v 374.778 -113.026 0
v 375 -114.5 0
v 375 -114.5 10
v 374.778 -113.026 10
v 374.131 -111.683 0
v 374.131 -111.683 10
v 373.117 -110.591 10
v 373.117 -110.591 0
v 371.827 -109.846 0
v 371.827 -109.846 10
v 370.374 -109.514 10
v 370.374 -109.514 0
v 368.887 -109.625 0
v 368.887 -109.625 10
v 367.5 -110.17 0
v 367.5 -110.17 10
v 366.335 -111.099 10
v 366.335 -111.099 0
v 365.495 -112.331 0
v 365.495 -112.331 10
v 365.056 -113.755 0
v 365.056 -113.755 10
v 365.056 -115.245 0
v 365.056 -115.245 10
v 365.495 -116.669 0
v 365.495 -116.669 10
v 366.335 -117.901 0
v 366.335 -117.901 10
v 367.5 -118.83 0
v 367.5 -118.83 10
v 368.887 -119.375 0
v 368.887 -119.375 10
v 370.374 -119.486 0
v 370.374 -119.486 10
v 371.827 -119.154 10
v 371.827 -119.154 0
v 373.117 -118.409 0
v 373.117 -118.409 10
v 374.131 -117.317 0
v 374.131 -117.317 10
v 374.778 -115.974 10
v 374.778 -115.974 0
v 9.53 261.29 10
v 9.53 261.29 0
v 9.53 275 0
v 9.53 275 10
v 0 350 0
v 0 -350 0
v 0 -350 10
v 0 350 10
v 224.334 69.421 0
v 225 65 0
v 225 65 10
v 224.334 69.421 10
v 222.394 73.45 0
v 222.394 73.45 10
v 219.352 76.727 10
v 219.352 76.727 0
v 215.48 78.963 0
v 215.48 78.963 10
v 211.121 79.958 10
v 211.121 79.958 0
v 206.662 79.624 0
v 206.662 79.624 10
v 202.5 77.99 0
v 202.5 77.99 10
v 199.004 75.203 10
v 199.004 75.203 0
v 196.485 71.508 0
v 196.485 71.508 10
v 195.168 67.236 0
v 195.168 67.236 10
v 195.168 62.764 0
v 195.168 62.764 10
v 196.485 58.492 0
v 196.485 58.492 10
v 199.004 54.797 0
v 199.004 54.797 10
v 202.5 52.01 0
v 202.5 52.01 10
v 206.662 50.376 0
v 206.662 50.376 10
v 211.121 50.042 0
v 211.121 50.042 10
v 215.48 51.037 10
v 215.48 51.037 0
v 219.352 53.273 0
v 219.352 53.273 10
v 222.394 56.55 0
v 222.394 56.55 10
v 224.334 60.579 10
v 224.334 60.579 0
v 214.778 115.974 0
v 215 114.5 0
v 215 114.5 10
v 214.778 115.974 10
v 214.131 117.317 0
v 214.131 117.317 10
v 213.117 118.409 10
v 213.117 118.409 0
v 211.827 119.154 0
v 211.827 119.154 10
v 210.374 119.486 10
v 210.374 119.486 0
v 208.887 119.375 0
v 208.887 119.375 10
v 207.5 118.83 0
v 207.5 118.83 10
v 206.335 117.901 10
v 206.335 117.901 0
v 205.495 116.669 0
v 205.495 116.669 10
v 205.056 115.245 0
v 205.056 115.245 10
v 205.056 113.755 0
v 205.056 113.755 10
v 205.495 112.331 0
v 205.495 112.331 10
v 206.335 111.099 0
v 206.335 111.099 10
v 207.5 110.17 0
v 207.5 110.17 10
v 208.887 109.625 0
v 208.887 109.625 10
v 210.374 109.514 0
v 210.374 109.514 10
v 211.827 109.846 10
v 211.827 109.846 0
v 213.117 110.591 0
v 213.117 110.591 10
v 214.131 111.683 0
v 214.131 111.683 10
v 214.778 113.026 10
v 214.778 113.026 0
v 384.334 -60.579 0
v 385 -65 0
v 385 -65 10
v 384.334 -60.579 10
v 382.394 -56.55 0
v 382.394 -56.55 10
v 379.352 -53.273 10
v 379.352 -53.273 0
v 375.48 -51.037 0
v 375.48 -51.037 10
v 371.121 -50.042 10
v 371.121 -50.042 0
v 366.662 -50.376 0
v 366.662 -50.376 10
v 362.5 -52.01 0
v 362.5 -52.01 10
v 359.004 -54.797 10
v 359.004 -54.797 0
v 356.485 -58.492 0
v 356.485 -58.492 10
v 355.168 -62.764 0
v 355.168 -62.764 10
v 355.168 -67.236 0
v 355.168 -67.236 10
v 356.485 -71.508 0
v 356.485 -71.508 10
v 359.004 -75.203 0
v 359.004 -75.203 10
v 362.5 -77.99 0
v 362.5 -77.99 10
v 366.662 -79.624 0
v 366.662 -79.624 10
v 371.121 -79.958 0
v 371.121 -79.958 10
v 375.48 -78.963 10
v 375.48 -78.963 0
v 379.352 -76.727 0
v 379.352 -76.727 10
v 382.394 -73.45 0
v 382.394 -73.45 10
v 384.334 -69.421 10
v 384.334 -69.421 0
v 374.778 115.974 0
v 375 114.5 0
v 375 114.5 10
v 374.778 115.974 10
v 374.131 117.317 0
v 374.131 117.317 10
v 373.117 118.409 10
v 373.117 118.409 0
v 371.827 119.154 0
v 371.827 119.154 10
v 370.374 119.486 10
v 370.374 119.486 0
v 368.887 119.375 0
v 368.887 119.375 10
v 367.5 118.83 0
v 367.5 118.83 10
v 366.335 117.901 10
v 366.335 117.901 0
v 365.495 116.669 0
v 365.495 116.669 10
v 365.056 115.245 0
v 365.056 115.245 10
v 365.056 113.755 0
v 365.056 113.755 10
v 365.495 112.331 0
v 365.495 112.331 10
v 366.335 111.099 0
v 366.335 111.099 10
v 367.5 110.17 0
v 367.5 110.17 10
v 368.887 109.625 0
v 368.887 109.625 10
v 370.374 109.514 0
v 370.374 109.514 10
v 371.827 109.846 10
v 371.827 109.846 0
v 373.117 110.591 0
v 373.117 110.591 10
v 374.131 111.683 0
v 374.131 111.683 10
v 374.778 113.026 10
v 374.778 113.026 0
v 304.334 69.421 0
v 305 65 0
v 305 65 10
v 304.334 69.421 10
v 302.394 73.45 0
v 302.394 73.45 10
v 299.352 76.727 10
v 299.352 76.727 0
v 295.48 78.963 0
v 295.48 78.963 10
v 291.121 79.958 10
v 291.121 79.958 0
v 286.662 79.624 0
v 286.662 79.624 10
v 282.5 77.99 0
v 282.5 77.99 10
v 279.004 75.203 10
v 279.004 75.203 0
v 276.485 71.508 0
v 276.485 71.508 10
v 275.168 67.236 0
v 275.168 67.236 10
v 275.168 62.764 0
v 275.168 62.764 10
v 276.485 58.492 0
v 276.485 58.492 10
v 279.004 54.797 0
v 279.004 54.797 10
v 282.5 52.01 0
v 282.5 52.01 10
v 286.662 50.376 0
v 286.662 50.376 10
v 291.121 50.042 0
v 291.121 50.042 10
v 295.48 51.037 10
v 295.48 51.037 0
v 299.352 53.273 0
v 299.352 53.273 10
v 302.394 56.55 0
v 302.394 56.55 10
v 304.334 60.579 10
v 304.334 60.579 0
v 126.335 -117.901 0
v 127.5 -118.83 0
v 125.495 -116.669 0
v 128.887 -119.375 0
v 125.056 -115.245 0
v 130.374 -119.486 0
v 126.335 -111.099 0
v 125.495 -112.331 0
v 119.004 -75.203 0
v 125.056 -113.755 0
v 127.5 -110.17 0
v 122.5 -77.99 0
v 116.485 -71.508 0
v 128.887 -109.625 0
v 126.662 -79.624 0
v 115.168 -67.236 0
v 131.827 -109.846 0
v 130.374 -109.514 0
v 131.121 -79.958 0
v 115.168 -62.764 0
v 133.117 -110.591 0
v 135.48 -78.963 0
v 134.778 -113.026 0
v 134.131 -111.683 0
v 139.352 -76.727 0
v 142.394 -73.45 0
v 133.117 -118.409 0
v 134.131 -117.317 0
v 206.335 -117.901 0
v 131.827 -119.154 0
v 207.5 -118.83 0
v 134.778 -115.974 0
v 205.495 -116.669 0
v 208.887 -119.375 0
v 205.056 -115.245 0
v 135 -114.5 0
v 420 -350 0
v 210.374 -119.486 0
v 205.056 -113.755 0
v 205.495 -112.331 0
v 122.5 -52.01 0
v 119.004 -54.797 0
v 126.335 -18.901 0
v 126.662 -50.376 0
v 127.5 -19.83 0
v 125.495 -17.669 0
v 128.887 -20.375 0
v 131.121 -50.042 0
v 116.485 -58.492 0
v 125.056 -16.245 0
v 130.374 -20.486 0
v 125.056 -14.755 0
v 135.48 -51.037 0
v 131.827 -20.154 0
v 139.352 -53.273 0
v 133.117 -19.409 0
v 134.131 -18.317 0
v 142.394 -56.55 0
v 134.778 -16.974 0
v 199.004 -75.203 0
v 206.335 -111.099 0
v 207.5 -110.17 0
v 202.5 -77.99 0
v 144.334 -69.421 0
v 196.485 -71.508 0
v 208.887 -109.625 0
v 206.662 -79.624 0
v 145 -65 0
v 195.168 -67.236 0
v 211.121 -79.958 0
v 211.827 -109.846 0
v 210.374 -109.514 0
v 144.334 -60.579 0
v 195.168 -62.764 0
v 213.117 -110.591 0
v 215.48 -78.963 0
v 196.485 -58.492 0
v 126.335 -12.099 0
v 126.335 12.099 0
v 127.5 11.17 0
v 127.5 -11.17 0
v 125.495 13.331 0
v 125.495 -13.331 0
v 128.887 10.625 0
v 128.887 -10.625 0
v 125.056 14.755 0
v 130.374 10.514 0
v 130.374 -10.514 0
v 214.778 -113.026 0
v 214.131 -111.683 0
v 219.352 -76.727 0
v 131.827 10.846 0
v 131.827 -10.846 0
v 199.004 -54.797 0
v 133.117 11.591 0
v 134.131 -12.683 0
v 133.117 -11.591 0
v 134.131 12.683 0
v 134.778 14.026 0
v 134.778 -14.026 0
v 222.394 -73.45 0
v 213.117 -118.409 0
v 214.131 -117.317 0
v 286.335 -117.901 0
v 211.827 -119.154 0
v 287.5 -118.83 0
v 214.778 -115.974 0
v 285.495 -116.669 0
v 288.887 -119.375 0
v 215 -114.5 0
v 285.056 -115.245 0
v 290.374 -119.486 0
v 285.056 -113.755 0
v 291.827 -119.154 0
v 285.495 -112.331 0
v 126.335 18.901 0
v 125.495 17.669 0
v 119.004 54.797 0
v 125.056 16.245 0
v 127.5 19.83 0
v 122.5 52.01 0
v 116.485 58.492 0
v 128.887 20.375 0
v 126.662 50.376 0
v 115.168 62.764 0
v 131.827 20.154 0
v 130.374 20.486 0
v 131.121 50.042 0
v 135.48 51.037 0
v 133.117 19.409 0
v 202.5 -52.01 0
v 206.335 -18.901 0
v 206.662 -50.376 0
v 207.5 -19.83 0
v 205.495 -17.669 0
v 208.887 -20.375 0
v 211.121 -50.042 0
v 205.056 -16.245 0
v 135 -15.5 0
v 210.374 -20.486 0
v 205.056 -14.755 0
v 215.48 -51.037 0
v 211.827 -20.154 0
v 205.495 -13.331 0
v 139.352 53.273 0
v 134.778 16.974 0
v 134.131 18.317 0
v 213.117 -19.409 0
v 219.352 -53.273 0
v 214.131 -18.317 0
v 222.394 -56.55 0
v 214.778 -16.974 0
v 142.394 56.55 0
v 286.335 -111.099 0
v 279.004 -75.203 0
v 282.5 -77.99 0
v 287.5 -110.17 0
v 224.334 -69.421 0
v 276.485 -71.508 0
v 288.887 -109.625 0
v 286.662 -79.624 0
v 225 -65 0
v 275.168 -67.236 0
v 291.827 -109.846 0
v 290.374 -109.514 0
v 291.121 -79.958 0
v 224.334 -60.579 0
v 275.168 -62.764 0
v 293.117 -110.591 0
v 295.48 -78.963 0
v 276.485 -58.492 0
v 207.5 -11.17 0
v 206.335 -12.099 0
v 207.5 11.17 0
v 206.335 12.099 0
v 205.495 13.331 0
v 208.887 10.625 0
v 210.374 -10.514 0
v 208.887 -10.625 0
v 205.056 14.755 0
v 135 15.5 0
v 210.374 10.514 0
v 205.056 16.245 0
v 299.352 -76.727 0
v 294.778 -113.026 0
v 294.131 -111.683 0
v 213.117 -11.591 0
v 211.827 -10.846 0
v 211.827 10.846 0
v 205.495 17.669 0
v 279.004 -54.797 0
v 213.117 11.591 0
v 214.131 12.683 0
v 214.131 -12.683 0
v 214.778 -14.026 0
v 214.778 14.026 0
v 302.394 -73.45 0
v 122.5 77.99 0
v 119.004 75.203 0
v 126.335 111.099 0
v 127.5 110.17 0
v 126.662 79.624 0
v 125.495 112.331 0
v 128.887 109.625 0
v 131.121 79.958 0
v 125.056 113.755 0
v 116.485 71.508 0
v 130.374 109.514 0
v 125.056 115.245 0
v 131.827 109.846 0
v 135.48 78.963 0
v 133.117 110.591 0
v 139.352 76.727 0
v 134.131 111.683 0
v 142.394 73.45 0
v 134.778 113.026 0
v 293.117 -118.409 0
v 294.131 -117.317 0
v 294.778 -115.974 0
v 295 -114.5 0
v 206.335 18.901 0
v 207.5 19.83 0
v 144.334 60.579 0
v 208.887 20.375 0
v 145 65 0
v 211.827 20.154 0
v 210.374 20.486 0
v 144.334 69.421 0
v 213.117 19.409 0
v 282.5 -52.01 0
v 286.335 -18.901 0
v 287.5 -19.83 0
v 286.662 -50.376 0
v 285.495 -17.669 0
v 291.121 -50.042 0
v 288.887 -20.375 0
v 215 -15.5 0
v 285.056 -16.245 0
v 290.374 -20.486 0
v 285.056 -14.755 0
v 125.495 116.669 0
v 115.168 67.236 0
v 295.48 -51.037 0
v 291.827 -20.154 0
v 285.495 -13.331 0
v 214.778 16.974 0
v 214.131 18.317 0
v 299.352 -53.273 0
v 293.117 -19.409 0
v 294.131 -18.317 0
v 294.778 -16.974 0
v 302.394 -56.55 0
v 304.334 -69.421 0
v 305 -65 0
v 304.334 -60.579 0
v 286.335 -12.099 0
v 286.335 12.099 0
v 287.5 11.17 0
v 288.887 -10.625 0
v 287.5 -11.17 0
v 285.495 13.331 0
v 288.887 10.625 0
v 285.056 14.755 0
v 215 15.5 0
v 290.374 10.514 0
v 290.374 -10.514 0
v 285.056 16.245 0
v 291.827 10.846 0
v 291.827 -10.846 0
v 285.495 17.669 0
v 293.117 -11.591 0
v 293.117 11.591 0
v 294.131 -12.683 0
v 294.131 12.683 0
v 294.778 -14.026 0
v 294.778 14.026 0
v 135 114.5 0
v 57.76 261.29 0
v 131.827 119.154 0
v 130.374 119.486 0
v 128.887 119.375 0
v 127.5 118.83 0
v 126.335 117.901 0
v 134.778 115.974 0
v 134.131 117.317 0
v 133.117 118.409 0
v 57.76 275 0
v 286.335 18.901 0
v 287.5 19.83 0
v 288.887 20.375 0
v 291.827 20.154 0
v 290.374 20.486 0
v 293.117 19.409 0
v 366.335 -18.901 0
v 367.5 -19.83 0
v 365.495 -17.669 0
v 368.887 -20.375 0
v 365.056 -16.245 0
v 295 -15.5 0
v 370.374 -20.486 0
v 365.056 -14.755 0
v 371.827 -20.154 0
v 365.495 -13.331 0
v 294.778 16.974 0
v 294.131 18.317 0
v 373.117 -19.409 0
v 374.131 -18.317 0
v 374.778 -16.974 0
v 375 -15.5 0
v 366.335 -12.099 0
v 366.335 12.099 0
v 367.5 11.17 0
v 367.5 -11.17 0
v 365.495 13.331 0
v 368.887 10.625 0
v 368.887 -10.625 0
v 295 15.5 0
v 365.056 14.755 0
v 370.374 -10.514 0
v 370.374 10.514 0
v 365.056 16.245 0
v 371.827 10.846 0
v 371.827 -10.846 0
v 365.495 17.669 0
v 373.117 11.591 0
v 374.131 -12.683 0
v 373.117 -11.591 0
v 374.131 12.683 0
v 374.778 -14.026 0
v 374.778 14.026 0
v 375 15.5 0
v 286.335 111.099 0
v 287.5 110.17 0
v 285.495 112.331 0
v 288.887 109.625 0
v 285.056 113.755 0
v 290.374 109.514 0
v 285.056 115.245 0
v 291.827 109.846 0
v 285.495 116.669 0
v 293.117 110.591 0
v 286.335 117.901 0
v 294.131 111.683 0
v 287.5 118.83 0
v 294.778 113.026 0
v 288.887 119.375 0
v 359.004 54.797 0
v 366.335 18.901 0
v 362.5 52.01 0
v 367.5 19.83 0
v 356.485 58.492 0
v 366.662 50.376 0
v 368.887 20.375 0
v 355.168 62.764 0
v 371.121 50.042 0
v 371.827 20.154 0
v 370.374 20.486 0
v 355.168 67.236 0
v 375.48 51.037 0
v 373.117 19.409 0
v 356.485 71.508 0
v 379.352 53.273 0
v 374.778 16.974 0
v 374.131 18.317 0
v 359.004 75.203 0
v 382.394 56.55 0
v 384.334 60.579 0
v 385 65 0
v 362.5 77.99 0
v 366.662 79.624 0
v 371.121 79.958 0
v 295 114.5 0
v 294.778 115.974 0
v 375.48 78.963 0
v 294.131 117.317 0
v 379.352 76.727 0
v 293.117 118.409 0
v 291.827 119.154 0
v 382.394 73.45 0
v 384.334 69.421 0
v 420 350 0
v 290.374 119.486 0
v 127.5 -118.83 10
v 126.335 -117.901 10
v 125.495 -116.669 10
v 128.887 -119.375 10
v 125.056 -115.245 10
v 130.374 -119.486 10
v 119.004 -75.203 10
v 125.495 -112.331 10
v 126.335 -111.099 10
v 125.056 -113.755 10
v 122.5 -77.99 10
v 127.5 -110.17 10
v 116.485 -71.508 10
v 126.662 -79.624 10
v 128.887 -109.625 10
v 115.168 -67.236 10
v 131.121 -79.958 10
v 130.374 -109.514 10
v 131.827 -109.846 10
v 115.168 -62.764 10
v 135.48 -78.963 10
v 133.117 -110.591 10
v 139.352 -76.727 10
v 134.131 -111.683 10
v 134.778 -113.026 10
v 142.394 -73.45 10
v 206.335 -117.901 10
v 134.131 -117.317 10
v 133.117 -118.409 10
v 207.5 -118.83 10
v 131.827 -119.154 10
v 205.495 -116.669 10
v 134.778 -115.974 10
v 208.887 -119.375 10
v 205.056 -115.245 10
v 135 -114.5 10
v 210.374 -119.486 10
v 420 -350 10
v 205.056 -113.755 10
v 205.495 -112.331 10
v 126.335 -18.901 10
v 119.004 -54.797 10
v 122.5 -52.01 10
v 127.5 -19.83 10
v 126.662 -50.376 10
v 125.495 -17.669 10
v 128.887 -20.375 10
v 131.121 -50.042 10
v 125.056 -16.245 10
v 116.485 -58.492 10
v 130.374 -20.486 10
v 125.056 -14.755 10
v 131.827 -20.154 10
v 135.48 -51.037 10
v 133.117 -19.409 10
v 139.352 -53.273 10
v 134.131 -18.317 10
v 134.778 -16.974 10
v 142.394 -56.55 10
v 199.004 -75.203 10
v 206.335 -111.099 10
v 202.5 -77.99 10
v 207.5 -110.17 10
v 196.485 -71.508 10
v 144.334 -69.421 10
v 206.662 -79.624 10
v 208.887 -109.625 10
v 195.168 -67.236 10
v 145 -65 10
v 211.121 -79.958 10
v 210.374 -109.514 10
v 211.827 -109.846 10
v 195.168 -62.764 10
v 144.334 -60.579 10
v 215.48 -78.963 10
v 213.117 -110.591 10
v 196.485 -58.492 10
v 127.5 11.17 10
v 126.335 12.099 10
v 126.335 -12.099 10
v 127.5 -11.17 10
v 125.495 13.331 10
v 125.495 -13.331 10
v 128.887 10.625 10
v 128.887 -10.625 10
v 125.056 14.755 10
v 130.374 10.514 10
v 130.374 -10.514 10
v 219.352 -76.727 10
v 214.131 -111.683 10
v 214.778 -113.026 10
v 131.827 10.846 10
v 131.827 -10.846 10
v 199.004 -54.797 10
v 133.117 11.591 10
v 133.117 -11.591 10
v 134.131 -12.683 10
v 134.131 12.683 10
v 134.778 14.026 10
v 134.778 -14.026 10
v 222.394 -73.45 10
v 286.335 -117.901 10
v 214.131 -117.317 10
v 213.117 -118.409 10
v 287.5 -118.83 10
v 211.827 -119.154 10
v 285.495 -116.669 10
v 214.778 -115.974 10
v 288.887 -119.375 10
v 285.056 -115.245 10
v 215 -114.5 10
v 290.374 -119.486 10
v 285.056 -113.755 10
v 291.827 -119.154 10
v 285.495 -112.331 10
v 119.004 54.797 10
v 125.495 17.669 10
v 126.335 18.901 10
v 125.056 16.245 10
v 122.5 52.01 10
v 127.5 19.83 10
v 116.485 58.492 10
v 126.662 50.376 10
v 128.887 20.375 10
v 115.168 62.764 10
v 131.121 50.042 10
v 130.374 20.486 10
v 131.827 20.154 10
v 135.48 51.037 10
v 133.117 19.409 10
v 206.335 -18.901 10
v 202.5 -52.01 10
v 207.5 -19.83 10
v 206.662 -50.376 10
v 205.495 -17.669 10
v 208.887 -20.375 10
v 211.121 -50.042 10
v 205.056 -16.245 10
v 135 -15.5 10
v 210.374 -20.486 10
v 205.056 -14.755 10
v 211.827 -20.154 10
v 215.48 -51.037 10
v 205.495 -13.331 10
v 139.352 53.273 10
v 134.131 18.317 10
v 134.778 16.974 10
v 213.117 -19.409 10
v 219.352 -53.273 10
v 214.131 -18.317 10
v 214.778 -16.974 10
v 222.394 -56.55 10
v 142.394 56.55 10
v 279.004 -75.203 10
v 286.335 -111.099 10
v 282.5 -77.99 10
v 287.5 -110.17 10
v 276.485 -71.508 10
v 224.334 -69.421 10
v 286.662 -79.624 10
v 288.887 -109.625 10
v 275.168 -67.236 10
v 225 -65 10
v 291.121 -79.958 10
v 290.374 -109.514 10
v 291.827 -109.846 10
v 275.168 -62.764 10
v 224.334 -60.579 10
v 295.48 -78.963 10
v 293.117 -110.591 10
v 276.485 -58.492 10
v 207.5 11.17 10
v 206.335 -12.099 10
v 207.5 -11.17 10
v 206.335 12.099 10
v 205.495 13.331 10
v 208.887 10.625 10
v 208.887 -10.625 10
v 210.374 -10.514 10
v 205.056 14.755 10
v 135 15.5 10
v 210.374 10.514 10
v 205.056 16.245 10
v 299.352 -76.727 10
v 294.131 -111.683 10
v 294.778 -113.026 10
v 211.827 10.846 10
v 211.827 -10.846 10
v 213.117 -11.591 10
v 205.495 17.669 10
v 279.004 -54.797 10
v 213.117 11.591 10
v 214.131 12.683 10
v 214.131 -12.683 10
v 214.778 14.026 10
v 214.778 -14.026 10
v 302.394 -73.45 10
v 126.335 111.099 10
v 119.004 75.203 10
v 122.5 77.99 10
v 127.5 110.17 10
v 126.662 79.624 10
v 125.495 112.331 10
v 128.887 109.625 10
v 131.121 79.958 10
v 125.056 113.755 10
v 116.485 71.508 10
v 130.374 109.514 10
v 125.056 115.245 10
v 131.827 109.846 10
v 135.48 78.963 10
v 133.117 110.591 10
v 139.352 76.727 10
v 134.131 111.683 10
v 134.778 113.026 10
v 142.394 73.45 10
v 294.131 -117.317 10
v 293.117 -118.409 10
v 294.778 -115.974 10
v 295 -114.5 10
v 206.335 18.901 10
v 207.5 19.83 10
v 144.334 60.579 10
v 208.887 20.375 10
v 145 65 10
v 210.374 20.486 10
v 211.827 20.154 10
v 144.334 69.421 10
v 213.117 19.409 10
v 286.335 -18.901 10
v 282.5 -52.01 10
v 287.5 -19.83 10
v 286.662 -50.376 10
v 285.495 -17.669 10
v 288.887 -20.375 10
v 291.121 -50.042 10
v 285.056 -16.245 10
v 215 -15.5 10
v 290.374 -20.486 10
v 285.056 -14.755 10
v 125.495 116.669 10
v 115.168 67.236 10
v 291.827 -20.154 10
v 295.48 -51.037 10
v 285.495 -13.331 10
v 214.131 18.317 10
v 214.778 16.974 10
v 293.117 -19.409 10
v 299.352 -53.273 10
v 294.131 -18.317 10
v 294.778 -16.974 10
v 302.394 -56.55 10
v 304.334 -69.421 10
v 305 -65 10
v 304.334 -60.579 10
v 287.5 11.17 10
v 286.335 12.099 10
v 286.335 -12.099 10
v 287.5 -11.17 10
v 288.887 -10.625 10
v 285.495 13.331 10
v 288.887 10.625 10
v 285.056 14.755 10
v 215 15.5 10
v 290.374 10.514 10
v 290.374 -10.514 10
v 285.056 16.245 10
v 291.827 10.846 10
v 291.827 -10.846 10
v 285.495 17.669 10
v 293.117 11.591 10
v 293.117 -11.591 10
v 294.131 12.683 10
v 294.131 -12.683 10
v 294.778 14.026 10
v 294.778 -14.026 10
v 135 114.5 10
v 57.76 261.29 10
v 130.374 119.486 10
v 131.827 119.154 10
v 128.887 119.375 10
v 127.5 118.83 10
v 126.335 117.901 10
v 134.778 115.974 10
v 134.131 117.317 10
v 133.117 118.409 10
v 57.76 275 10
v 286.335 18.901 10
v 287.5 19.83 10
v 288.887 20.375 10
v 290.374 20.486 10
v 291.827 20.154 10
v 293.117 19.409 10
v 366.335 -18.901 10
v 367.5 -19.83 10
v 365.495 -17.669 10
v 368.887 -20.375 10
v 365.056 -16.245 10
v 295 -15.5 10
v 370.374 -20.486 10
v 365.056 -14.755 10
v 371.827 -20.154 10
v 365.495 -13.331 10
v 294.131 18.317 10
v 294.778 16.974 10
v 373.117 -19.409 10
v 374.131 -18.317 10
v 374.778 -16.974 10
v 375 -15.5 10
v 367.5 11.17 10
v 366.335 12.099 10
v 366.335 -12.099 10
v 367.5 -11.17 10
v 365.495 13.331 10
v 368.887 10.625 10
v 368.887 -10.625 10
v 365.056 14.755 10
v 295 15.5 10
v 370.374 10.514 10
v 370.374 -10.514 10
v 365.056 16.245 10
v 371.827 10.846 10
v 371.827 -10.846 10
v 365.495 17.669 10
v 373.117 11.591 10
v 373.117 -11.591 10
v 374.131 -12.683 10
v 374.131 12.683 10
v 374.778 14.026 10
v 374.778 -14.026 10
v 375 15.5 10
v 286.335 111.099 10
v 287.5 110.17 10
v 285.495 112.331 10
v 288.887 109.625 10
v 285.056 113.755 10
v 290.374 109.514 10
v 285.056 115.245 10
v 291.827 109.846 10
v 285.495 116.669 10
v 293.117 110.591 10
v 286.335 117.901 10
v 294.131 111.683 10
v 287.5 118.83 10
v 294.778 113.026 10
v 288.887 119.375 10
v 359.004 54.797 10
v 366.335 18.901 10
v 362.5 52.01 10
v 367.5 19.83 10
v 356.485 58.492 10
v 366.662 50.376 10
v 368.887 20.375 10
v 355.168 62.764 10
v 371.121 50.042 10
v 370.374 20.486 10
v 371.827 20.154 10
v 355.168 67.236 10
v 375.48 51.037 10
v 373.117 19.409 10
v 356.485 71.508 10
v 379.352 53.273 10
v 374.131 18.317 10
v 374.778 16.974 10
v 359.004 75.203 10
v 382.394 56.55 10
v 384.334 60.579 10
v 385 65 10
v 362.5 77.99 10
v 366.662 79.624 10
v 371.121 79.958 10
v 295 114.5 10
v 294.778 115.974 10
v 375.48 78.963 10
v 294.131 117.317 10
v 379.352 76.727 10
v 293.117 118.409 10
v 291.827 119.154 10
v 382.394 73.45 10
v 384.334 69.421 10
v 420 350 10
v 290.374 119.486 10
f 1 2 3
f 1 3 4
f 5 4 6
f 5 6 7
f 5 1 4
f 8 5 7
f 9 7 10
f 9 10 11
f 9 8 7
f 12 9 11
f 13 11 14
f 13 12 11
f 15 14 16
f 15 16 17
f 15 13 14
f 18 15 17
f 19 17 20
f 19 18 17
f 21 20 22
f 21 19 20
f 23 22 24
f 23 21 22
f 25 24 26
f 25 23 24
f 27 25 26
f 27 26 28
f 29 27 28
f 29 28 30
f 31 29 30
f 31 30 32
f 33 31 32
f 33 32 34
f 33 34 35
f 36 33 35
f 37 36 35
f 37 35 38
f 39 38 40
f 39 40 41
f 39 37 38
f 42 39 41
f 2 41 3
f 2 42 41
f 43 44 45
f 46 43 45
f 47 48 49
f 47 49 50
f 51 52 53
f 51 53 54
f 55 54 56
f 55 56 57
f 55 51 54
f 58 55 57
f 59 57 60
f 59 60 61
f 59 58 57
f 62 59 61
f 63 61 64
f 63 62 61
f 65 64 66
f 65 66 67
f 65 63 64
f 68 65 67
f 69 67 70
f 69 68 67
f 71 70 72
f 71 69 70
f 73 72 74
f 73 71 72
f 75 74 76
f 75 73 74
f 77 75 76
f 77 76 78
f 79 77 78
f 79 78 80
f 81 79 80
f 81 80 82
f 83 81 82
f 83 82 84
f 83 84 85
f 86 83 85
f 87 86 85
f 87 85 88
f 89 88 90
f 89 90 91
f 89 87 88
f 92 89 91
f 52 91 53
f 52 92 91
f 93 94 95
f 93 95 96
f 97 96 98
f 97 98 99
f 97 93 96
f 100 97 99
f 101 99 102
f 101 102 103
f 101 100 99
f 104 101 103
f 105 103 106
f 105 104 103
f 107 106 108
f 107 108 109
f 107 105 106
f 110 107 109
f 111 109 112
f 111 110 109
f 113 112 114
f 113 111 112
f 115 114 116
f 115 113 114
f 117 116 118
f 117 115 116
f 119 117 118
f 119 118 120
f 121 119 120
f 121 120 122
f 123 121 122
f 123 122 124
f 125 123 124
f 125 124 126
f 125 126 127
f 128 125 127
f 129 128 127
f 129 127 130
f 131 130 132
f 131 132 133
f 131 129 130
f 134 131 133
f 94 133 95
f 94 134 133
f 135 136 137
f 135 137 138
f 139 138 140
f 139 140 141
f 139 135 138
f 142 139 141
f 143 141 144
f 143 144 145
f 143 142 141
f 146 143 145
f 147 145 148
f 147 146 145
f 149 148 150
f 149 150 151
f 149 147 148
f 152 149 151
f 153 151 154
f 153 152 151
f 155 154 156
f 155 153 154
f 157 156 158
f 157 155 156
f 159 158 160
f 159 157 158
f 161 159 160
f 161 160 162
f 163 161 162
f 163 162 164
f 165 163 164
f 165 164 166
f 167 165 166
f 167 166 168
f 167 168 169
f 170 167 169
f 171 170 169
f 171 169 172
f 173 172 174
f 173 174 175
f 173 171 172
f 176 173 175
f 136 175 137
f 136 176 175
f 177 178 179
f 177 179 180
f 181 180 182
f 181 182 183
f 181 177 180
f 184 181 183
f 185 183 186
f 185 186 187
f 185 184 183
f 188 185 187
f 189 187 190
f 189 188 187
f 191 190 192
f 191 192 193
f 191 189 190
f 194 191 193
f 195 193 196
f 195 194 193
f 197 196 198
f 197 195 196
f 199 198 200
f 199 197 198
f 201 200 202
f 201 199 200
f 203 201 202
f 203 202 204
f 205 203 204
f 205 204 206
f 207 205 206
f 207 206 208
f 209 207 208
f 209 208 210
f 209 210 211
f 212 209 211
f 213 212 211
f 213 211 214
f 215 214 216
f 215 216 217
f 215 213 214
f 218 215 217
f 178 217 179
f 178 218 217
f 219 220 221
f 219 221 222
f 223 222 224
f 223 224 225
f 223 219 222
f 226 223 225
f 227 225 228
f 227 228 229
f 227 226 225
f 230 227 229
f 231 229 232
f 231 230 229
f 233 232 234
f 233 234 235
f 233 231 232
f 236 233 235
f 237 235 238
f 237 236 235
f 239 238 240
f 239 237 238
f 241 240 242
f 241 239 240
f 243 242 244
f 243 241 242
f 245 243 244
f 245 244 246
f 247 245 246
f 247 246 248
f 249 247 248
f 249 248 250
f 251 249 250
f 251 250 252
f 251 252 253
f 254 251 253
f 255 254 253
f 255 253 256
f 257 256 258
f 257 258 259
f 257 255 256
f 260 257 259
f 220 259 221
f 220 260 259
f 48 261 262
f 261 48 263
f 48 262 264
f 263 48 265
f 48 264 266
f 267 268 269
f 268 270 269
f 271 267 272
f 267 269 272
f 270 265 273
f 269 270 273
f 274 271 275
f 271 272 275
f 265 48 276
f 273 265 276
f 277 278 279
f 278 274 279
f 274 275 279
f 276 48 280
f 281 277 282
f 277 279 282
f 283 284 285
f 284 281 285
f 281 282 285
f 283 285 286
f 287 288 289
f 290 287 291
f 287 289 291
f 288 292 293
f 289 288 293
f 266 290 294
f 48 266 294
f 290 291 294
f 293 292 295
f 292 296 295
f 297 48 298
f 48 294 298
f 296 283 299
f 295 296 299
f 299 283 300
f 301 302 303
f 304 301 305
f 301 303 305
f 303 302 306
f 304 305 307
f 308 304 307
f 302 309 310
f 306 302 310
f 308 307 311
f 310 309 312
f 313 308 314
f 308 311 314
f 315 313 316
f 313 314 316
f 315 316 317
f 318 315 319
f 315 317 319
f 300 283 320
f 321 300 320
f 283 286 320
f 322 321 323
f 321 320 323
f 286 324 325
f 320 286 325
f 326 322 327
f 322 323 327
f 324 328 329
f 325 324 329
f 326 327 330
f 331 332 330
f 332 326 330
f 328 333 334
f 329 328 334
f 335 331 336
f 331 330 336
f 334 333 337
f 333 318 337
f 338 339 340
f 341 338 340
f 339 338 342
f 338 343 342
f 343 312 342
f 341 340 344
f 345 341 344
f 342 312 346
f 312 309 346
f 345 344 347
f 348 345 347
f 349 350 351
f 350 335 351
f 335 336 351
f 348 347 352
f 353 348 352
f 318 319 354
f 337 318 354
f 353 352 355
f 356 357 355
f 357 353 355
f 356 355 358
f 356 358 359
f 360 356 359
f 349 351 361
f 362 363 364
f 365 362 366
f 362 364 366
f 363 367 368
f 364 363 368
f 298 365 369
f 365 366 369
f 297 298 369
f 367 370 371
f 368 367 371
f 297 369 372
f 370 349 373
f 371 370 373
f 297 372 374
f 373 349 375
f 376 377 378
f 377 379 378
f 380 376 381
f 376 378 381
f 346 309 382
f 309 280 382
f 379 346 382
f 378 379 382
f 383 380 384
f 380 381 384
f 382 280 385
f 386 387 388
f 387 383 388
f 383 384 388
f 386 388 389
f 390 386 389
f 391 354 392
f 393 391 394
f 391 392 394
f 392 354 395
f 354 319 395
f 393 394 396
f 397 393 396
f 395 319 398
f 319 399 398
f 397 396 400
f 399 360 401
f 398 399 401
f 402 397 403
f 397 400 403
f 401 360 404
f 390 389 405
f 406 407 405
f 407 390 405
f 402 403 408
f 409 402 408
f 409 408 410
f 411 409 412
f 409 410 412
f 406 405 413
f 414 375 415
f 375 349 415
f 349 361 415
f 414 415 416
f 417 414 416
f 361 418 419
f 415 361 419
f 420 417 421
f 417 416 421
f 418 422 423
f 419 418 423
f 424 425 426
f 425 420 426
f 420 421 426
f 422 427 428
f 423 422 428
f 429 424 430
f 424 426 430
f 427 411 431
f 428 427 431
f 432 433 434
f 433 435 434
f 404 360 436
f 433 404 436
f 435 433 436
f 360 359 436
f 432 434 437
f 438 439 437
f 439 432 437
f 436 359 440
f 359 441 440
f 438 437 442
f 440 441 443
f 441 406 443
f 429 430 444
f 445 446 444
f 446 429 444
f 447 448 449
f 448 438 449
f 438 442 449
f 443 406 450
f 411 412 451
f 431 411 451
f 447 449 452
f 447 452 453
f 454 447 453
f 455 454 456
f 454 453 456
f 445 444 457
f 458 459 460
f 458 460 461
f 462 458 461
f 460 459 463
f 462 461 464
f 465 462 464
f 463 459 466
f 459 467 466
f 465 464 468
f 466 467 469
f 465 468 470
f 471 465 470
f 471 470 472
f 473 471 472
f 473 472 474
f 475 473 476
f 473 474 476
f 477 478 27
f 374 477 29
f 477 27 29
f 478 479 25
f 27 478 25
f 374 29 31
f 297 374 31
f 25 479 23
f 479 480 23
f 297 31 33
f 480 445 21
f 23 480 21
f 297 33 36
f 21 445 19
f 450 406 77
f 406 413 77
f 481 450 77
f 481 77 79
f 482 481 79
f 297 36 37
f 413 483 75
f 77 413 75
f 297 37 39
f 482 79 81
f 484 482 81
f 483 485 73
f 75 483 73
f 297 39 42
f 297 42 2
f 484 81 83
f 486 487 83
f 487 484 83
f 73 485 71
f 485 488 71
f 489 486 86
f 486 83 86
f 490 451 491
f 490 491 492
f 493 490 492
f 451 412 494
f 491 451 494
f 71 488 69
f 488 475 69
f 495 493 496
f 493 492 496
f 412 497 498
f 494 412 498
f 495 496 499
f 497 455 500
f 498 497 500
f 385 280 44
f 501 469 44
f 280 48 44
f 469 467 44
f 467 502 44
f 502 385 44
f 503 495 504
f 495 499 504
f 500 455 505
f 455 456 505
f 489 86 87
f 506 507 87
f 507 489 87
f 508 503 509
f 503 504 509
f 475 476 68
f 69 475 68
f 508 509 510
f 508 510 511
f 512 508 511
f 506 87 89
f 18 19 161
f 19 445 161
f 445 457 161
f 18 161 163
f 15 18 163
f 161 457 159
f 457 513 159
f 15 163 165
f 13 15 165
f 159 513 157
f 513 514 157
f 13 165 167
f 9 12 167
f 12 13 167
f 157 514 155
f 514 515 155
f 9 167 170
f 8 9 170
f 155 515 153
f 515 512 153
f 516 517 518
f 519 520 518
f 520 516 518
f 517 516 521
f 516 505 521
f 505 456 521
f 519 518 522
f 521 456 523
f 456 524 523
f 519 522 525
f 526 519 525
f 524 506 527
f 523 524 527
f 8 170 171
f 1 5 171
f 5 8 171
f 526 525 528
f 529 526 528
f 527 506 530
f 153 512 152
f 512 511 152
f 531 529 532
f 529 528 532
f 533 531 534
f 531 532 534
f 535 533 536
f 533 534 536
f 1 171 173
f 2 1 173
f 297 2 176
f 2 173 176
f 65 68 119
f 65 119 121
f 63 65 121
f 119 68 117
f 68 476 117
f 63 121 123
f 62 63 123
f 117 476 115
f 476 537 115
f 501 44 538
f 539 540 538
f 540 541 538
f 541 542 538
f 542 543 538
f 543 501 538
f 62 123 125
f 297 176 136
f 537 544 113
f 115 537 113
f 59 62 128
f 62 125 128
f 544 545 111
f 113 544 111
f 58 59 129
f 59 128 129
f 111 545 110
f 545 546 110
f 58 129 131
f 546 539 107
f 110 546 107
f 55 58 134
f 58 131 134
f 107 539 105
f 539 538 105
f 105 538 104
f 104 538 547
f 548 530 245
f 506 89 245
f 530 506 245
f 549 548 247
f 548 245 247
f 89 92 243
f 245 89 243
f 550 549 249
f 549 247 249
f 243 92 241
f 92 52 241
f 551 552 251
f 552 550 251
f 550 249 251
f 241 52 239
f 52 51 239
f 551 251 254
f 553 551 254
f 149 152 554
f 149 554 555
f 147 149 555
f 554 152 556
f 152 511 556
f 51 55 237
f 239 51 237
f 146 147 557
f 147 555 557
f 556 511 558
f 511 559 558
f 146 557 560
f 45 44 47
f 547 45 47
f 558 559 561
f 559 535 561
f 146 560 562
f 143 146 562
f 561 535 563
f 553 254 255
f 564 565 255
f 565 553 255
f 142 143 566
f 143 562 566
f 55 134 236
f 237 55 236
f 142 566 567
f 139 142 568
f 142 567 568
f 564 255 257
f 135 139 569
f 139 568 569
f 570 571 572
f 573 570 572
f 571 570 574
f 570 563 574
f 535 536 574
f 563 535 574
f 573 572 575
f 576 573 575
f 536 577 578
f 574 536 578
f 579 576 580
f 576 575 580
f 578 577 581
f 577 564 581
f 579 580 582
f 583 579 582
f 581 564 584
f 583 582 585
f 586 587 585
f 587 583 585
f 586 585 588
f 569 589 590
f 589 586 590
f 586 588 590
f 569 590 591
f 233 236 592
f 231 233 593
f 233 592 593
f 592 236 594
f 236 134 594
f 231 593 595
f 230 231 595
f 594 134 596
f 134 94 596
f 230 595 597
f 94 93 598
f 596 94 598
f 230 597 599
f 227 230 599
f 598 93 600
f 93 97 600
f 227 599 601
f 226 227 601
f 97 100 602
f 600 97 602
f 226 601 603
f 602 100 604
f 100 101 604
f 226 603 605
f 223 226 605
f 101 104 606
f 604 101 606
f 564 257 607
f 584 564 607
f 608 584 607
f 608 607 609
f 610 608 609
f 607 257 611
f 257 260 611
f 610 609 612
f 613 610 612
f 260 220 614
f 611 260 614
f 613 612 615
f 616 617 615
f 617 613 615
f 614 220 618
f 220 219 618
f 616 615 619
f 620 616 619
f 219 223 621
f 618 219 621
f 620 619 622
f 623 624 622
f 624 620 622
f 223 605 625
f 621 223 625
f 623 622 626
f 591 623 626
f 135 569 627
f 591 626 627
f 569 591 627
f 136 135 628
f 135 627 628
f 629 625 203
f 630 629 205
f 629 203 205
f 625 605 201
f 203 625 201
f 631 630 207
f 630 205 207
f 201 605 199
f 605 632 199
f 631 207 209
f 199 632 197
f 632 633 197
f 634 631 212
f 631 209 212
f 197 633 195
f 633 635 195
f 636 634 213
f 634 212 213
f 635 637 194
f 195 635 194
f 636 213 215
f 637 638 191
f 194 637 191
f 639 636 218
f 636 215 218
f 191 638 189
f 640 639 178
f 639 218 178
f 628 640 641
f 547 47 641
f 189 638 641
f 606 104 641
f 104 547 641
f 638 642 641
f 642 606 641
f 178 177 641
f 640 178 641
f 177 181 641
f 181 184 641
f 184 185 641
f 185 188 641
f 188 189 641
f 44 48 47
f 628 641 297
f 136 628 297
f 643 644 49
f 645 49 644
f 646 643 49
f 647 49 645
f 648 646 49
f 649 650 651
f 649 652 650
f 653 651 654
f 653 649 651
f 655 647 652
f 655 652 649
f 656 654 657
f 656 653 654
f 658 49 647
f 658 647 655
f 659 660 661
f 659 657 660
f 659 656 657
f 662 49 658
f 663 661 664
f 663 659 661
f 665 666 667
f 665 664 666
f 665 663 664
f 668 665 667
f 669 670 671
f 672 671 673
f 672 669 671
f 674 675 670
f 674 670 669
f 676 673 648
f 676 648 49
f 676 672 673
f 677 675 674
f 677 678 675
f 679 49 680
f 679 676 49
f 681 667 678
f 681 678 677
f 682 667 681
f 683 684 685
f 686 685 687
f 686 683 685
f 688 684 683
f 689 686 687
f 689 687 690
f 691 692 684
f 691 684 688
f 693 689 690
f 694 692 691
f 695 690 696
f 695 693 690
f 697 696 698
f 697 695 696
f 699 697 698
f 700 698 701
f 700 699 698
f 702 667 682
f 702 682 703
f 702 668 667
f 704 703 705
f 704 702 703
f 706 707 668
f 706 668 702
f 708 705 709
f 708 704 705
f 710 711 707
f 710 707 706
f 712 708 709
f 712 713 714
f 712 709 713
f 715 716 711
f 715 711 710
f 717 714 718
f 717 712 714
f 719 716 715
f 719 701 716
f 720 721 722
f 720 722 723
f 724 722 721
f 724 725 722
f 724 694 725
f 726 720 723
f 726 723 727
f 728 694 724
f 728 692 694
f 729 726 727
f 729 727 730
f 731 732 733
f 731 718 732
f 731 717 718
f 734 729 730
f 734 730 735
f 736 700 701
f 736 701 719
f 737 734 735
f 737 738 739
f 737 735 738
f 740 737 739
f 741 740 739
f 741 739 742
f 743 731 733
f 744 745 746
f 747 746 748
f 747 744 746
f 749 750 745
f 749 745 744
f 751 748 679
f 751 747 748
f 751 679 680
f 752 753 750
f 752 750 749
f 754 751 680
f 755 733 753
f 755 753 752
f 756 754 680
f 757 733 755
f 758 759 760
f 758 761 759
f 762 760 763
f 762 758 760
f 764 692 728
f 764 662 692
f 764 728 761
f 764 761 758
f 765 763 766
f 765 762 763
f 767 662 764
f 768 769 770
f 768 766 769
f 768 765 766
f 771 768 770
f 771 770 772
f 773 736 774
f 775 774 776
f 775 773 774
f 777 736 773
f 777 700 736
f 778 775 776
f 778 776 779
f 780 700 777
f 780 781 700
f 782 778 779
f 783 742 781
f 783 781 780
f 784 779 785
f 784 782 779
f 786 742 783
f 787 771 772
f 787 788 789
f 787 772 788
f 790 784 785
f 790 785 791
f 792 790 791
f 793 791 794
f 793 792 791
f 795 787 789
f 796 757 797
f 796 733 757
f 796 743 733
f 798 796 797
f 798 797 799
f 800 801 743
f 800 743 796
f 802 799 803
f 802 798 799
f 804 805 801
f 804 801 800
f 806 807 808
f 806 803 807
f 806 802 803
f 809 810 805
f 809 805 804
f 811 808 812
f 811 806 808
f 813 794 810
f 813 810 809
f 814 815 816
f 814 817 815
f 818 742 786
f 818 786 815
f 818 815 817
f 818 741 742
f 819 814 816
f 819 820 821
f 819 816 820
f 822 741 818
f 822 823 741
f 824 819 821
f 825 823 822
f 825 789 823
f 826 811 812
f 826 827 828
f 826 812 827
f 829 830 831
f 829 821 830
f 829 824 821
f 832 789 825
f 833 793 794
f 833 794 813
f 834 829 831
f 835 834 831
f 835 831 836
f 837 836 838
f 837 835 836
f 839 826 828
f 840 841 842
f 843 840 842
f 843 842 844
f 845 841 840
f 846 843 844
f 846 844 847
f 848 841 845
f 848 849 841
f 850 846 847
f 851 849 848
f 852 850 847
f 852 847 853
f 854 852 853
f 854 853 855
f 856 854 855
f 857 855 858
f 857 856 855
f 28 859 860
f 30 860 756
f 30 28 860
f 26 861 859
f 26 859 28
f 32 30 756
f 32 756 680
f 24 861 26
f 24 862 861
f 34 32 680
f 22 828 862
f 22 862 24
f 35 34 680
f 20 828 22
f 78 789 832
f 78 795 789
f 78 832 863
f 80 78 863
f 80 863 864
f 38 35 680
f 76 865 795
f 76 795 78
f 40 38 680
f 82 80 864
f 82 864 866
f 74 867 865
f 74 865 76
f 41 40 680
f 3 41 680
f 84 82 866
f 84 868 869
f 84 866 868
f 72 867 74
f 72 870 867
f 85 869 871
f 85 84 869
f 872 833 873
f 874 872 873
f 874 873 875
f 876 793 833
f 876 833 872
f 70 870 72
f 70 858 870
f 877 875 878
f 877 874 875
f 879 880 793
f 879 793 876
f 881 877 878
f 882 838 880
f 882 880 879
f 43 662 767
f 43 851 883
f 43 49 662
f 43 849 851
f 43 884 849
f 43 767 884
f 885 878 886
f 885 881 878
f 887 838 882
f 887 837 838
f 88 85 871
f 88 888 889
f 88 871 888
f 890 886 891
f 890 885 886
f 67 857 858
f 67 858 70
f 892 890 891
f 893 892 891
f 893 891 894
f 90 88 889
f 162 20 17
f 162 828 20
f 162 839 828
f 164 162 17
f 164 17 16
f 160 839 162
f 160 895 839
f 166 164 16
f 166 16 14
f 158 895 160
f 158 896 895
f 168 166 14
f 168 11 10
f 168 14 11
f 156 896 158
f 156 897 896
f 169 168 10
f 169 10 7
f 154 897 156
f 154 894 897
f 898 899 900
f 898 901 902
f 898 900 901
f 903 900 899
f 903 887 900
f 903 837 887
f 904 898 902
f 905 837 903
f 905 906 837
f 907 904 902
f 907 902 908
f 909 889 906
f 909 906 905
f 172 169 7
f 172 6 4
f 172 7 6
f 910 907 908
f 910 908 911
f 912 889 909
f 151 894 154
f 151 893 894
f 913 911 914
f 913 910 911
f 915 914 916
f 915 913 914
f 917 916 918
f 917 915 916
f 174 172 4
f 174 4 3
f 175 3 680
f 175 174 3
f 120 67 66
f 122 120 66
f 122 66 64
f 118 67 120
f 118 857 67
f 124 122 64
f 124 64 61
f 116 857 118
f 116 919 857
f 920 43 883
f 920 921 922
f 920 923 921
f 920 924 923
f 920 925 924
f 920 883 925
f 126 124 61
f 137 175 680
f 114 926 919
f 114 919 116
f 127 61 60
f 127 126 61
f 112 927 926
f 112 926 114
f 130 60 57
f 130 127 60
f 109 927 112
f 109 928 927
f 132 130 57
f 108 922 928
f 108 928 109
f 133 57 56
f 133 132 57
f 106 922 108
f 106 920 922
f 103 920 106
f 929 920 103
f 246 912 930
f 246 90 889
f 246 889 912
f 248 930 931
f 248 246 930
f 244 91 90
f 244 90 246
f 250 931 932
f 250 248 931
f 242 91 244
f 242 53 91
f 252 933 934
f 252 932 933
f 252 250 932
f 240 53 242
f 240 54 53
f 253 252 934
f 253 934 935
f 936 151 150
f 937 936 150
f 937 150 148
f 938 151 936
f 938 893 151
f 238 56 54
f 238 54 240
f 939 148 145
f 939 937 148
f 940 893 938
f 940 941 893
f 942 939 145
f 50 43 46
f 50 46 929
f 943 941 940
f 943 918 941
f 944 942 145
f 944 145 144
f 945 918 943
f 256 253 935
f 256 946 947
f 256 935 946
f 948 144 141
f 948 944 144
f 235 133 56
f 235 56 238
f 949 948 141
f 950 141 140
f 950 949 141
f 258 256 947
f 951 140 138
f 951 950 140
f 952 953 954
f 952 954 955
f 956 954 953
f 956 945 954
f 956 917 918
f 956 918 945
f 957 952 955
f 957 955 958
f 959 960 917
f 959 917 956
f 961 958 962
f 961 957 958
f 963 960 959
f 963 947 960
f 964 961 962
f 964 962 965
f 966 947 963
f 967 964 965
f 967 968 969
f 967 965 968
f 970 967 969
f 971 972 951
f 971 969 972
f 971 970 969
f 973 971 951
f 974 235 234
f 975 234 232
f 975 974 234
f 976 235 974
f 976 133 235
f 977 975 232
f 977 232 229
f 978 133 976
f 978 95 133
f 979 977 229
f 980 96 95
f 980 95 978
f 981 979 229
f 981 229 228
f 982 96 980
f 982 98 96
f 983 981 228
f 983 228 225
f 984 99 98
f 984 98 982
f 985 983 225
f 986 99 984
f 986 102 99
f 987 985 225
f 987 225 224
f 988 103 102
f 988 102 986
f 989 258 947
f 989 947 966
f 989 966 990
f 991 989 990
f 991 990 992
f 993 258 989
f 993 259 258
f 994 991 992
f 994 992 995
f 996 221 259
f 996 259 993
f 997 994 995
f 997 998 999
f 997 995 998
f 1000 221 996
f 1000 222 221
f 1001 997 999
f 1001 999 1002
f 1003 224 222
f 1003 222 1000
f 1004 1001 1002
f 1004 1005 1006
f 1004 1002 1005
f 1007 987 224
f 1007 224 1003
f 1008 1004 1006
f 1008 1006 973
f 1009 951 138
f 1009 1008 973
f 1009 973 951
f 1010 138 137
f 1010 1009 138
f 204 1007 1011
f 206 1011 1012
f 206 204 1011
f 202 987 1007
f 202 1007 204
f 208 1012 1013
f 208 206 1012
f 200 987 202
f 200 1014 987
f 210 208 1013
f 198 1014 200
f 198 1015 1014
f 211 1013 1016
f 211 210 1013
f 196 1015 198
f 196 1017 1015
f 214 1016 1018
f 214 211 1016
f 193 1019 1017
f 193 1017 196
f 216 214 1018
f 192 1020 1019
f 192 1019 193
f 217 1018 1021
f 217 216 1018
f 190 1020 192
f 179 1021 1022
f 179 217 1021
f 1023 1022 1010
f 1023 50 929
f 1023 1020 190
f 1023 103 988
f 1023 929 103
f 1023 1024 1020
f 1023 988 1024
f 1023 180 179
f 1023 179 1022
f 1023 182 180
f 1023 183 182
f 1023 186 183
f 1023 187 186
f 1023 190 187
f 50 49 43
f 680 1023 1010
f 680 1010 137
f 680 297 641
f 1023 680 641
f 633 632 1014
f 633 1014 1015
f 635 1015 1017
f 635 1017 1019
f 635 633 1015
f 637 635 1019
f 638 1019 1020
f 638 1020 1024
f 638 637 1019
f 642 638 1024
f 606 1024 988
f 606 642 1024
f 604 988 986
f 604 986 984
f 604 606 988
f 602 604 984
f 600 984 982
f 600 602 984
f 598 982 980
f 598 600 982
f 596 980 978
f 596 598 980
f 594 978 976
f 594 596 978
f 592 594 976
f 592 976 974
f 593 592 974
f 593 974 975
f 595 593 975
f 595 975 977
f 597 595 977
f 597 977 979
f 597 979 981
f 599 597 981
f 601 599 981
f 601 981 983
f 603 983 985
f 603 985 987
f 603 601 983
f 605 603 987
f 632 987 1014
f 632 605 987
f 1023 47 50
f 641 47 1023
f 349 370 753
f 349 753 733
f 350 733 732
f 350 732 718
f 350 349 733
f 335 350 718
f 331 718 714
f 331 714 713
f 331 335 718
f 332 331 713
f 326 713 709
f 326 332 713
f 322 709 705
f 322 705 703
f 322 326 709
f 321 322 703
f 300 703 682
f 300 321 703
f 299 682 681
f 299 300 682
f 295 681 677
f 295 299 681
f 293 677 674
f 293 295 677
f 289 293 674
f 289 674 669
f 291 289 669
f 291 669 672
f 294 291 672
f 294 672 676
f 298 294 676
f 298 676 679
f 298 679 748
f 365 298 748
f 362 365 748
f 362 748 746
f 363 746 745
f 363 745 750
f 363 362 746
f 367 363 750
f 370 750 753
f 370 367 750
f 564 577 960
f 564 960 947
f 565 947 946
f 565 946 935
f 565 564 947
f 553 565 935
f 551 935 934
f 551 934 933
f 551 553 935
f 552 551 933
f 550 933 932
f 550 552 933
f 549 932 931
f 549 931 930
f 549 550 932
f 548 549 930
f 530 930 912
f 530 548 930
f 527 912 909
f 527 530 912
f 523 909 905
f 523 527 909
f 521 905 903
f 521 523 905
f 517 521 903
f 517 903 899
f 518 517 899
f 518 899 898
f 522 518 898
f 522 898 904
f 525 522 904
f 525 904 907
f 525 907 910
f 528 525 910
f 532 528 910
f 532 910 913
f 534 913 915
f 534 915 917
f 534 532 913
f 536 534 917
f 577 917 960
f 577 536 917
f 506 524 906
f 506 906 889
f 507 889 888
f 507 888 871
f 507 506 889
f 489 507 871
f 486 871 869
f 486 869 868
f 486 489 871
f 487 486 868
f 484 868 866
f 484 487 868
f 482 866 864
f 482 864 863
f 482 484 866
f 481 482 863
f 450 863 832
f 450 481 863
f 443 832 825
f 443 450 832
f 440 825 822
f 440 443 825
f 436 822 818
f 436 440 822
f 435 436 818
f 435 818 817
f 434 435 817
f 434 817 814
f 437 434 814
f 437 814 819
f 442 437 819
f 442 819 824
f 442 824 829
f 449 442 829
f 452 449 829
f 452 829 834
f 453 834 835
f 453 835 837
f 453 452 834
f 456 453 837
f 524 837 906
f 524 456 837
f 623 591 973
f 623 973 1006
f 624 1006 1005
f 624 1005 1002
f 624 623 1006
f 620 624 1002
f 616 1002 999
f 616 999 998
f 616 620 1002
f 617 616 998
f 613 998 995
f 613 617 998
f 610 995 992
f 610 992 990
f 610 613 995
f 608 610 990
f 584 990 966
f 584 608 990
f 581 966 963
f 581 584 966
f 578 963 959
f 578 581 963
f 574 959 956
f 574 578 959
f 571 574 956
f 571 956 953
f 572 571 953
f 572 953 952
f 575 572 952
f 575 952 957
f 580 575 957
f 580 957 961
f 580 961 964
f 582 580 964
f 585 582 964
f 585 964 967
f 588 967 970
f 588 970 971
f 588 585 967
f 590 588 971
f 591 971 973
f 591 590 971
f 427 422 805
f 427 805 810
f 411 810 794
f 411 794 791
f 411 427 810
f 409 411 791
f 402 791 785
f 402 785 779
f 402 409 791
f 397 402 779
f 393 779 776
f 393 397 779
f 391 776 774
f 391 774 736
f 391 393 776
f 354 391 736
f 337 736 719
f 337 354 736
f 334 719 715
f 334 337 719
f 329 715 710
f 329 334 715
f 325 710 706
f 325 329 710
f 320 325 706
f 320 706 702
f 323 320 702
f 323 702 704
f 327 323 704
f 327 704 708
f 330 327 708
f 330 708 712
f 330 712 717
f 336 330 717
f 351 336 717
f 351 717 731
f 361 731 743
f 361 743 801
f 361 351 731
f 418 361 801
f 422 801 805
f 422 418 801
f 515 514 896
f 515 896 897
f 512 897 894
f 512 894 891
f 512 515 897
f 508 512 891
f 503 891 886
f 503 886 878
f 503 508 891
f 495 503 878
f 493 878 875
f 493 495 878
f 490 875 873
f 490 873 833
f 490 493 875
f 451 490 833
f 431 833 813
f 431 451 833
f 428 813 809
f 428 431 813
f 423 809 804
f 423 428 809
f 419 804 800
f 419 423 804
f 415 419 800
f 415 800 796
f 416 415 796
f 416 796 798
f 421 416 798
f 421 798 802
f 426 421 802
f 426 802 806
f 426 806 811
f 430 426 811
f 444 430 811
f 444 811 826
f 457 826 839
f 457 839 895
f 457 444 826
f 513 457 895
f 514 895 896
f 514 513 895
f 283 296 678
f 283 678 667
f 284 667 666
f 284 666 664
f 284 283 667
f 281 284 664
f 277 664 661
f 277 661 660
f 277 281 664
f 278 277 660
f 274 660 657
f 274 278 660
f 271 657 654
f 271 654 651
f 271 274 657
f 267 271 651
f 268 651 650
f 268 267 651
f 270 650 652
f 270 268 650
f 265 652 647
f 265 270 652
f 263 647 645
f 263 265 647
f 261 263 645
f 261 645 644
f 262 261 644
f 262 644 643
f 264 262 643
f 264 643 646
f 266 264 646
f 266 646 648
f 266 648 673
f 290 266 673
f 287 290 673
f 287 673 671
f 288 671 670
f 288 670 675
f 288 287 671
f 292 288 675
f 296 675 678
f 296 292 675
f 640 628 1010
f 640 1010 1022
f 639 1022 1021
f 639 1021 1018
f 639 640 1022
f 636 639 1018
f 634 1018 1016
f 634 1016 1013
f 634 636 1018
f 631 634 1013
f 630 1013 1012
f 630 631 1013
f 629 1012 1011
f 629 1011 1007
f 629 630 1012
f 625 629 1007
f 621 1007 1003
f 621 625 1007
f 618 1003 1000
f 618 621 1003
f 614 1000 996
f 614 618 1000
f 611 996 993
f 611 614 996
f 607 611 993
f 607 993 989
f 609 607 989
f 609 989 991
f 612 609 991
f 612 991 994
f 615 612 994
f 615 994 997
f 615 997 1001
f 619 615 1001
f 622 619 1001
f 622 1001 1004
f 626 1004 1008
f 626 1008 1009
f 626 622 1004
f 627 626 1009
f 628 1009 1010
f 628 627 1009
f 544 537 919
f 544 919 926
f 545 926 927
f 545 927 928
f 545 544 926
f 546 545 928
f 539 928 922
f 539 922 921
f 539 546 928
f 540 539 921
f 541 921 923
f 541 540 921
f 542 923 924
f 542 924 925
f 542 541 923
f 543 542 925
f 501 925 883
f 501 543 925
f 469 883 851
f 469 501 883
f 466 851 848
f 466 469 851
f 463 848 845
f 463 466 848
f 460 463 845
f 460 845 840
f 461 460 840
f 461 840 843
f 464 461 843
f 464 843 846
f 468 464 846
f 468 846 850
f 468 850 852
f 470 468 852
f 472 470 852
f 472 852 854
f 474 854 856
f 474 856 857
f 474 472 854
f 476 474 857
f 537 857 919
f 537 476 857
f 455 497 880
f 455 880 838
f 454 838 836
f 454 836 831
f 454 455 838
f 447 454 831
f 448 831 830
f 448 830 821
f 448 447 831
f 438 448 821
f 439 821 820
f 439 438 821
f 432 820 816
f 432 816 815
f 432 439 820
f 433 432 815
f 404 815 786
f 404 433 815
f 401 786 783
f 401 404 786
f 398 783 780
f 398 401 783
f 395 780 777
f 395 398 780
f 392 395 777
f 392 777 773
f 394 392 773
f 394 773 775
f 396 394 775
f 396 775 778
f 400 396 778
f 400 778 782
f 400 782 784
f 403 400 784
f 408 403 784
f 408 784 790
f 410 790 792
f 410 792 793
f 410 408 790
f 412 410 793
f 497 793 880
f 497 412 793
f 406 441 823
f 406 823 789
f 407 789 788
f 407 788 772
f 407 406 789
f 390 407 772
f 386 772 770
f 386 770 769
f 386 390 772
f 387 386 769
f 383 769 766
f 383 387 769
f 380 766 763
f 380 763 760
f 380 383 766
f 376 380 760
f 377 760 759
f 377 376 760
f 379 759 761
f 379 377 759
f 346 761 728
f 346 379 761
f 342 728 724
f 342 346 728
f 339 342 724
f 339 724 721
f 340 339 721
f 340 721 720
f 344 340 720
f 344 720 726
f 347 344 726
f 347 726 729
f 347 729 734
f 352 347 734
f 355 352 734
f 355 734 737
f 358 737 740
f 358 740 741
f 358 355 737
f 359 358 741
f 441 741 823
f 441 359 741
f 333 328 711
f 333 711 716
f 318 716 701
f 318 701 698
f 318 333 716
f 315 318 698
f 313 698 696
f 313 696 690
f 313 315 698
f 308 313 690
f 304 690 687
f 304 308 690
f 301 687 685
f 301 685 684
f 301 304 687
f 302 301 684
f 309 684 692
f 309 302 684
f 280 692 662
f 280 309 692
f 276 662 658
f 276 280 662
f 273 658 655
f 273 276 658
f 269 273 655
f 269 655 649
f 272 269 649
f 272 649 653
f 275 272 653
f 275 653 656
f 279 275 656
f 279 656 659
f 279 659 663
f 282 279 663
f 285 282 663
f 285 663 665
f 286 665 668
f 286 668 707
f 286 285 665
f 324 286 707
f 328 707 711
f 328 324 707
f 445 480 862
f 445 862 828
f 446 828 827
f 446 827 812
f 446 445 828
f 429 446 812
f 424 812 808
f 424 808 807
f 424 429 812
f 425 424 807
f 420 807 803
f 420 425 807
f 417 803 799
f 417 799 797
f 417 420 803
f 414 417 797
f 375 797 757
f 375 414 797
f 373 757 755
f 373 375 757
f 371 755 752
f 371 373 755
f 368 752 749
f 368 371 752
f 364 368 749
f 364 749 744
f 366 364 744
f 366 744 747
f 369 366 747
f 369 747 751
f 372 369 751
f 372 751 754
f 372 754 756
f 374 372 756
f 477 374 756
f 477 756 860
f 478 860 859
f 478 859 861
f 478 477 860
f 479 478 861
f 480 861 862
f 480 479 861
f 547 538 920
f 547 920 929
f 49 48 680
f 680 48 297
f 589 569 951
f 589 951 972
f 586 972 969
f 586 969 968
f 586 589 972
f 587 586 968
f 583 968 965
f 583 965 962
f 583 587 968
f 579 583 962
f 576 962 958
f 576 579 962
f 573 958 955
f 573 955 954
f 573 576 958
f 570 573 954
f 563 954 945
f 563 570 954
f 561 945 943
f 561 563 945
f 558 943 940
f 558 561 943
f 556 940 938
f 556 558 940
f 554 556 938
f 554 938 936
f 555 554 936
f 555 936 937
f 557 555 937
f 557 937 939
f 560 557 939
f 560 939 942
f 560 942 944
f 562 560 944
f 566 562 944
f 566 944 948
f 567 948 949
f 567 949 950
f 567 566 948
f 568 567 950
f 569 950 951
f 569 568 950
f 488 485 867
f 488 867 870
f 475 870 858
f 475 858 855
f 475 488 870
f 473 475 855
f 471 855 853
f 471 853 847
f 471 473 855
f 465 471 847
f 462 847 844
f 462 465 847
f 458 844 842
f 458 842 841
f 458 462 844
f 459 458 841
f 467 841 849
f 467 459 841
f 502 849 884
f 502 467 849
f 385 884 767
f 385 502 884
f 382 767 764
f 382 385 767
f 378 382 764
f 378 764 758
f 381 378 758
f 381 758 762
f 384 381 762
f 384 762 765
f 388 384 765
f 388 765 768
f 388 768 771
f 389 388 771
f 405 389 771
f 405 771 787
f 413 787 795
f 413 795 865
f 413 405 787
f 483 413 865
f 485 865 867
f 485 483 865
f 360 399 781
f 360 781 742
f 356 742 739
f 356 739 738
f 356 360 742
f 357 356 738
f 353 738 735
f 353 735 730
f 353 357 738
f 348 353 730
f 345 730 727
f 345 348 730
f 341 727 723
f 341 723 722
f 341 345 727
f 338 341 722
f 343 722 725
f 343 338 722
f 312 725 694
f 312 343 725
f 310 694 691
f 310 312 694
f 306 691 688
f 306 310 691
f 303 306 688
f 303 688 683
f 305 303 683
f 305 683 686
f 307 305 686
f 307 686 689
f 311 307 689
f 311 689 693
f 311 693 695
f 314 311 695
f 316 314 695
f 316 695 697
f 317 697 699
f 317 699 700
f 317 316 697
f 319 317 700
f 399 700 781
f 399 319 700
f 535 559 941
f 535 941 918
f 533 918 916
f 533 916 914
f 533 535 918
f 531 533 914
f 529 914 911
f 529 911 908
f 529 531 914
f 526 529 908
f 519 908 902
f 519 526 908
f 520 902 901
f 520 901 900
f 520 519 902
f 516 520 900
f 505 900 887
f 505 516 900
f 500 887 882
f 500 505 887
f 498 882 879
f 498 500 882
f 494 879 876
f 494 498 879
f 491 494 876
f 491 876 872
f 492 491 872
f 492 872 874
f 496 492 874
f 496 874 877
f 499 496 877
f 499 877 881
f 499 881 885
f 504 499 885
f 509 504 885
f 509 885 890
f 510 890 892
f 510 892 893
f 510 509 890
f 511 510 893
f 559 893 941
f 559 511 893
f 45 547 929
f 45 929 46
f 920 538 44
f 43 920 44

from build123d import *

# Parameters (mm, degrees)
SKETCH_1_W          = 420
SKETCH_1_H          = 700
SKETCH_1_R          = 5
SKETCH_1_R_2        = 15
EXTRUDE_1_DEPTH     = 10
SKETCH_2_W          = 48.23
SKETCH_2_H          = 13.71
CUT_EXTRUDE_1_DEPTH = 10


with BuildPart() as part:
    # 草图1 → 凸台-拉伸1 (new body)
    with BuildSketch(Plane.XY):
        with Locations((210, 0)):
            Rectangle(SKETCH_1_W, SKETCH_1_H)
        with Locations((130, 114.5)):
            Circle(SKETCH_1_R, mode=Mode.SUBTRACT)
        with Locations((130, 15.5)):
            Circle(SKETCH_1_R, mode=Mode.SUBTRACT)
        with Locations((210, 114.5)):
            Circle(SKETCH_1_R, mode=Mode.SUBTRACT)
        with Locations((210, 15.5)):
            Circle(SKETCH_1_R, mode=Mode.SUBTRACT)
        with Locations((290, 114.5)):
            Circle(SKETCH_1_R, mode=Mode.SUBTRACT)
        with Locations((290, 15.5)):
            Circle(SKETCH_1_R, mode=Mode.SUBTRACT)
        with Locations((370, 114.5)):
            Circle(SKETCH_1_R, mode=Mode.SUBTRACT)
        with Locations((370, 15.5)):
            Circle(SKETCH_1_R, mode=Mode.SUBTRACT)
        with Locations((130, 65)):
            Circle(SKETCH_1_R_2, mode=Mode.SUBTRACT)
        with Locations((210, 65)):
            Circle(SKETCH_1_R_2, mode=Mode.SUBTRACT)
        with Locations((290, 65)):
            Circle(SKETCH_1_R_2, mode=Mode.SUBTRACT)
        with Locations((370, 65)):
            Circle(SKETCH_1_R_2, mode=Mode.SUBTRACT)
        with Locations((130, -114.5)):
            Circle(SKETCH_1_R, mode=Mode.SUBTRACT)
        with Locations((130, -15.5)):
            Circle(SKETCH_1_R, mode=Mode.SUBTRACT)
        with Locations((210, -114.5)):
            Circle(SKETCH_1_R, mode=Mode.SUBTRACT)
        with Locations((210, -15.5)):
            Circle(SKETCH_1_R, mode=Mode.SUBTRACT)
        with Locations((290, -114.5)):
            Circle(SKETCH_1_R, mode=Mode.SUBTRACT)
        with Locations((290, -15.5)):
            Circle(SKETCH_1_R, mode=Mode.SUBTRACT)
        with Locations((370, -114.5)):
            Circle(SKETCH_1_R, mode=Mode.SUBTRACT)
        with Locations((370, -15.5)):
            Circle(SKETCH_1_R, mode=Mode.SUBTRACT)
        with Locations((130, -65)):
            Circle(SKETCH_1_R_2, mode=Mode.SUBTRACT)
        with Locations((210, -65)):
            Circle(SKETCH_1_R_2, mode=Mode.SUBTRACT)
        with Locations((290, -65)):
            Circle(SKETCH_1_R_2, mode=Mode.SUBTRACT)
        with Locations((370, -65)):
            Circle(SKETCH_1_R_2, mode=Mode.SUBTRACT)
    extrude(amount=EXTRUDE_1_DEPTH)

    # 草图2 → 切除-拉伸1 (cut)
    with BuildSketch(Plane(origin=(0, 0, 0), x_dir=(-1, 0, 0), z_dir=(0, 0, -1))):
        with Locations((-33.645, 268.145)):
            Rectangle(SKETCH_2_W, SKETCH_2_H)
    extrude(amount=-CUT_EXTRUDE_1_DEPTH, mode=Mode.SUBTRACT)


solid = part.part
